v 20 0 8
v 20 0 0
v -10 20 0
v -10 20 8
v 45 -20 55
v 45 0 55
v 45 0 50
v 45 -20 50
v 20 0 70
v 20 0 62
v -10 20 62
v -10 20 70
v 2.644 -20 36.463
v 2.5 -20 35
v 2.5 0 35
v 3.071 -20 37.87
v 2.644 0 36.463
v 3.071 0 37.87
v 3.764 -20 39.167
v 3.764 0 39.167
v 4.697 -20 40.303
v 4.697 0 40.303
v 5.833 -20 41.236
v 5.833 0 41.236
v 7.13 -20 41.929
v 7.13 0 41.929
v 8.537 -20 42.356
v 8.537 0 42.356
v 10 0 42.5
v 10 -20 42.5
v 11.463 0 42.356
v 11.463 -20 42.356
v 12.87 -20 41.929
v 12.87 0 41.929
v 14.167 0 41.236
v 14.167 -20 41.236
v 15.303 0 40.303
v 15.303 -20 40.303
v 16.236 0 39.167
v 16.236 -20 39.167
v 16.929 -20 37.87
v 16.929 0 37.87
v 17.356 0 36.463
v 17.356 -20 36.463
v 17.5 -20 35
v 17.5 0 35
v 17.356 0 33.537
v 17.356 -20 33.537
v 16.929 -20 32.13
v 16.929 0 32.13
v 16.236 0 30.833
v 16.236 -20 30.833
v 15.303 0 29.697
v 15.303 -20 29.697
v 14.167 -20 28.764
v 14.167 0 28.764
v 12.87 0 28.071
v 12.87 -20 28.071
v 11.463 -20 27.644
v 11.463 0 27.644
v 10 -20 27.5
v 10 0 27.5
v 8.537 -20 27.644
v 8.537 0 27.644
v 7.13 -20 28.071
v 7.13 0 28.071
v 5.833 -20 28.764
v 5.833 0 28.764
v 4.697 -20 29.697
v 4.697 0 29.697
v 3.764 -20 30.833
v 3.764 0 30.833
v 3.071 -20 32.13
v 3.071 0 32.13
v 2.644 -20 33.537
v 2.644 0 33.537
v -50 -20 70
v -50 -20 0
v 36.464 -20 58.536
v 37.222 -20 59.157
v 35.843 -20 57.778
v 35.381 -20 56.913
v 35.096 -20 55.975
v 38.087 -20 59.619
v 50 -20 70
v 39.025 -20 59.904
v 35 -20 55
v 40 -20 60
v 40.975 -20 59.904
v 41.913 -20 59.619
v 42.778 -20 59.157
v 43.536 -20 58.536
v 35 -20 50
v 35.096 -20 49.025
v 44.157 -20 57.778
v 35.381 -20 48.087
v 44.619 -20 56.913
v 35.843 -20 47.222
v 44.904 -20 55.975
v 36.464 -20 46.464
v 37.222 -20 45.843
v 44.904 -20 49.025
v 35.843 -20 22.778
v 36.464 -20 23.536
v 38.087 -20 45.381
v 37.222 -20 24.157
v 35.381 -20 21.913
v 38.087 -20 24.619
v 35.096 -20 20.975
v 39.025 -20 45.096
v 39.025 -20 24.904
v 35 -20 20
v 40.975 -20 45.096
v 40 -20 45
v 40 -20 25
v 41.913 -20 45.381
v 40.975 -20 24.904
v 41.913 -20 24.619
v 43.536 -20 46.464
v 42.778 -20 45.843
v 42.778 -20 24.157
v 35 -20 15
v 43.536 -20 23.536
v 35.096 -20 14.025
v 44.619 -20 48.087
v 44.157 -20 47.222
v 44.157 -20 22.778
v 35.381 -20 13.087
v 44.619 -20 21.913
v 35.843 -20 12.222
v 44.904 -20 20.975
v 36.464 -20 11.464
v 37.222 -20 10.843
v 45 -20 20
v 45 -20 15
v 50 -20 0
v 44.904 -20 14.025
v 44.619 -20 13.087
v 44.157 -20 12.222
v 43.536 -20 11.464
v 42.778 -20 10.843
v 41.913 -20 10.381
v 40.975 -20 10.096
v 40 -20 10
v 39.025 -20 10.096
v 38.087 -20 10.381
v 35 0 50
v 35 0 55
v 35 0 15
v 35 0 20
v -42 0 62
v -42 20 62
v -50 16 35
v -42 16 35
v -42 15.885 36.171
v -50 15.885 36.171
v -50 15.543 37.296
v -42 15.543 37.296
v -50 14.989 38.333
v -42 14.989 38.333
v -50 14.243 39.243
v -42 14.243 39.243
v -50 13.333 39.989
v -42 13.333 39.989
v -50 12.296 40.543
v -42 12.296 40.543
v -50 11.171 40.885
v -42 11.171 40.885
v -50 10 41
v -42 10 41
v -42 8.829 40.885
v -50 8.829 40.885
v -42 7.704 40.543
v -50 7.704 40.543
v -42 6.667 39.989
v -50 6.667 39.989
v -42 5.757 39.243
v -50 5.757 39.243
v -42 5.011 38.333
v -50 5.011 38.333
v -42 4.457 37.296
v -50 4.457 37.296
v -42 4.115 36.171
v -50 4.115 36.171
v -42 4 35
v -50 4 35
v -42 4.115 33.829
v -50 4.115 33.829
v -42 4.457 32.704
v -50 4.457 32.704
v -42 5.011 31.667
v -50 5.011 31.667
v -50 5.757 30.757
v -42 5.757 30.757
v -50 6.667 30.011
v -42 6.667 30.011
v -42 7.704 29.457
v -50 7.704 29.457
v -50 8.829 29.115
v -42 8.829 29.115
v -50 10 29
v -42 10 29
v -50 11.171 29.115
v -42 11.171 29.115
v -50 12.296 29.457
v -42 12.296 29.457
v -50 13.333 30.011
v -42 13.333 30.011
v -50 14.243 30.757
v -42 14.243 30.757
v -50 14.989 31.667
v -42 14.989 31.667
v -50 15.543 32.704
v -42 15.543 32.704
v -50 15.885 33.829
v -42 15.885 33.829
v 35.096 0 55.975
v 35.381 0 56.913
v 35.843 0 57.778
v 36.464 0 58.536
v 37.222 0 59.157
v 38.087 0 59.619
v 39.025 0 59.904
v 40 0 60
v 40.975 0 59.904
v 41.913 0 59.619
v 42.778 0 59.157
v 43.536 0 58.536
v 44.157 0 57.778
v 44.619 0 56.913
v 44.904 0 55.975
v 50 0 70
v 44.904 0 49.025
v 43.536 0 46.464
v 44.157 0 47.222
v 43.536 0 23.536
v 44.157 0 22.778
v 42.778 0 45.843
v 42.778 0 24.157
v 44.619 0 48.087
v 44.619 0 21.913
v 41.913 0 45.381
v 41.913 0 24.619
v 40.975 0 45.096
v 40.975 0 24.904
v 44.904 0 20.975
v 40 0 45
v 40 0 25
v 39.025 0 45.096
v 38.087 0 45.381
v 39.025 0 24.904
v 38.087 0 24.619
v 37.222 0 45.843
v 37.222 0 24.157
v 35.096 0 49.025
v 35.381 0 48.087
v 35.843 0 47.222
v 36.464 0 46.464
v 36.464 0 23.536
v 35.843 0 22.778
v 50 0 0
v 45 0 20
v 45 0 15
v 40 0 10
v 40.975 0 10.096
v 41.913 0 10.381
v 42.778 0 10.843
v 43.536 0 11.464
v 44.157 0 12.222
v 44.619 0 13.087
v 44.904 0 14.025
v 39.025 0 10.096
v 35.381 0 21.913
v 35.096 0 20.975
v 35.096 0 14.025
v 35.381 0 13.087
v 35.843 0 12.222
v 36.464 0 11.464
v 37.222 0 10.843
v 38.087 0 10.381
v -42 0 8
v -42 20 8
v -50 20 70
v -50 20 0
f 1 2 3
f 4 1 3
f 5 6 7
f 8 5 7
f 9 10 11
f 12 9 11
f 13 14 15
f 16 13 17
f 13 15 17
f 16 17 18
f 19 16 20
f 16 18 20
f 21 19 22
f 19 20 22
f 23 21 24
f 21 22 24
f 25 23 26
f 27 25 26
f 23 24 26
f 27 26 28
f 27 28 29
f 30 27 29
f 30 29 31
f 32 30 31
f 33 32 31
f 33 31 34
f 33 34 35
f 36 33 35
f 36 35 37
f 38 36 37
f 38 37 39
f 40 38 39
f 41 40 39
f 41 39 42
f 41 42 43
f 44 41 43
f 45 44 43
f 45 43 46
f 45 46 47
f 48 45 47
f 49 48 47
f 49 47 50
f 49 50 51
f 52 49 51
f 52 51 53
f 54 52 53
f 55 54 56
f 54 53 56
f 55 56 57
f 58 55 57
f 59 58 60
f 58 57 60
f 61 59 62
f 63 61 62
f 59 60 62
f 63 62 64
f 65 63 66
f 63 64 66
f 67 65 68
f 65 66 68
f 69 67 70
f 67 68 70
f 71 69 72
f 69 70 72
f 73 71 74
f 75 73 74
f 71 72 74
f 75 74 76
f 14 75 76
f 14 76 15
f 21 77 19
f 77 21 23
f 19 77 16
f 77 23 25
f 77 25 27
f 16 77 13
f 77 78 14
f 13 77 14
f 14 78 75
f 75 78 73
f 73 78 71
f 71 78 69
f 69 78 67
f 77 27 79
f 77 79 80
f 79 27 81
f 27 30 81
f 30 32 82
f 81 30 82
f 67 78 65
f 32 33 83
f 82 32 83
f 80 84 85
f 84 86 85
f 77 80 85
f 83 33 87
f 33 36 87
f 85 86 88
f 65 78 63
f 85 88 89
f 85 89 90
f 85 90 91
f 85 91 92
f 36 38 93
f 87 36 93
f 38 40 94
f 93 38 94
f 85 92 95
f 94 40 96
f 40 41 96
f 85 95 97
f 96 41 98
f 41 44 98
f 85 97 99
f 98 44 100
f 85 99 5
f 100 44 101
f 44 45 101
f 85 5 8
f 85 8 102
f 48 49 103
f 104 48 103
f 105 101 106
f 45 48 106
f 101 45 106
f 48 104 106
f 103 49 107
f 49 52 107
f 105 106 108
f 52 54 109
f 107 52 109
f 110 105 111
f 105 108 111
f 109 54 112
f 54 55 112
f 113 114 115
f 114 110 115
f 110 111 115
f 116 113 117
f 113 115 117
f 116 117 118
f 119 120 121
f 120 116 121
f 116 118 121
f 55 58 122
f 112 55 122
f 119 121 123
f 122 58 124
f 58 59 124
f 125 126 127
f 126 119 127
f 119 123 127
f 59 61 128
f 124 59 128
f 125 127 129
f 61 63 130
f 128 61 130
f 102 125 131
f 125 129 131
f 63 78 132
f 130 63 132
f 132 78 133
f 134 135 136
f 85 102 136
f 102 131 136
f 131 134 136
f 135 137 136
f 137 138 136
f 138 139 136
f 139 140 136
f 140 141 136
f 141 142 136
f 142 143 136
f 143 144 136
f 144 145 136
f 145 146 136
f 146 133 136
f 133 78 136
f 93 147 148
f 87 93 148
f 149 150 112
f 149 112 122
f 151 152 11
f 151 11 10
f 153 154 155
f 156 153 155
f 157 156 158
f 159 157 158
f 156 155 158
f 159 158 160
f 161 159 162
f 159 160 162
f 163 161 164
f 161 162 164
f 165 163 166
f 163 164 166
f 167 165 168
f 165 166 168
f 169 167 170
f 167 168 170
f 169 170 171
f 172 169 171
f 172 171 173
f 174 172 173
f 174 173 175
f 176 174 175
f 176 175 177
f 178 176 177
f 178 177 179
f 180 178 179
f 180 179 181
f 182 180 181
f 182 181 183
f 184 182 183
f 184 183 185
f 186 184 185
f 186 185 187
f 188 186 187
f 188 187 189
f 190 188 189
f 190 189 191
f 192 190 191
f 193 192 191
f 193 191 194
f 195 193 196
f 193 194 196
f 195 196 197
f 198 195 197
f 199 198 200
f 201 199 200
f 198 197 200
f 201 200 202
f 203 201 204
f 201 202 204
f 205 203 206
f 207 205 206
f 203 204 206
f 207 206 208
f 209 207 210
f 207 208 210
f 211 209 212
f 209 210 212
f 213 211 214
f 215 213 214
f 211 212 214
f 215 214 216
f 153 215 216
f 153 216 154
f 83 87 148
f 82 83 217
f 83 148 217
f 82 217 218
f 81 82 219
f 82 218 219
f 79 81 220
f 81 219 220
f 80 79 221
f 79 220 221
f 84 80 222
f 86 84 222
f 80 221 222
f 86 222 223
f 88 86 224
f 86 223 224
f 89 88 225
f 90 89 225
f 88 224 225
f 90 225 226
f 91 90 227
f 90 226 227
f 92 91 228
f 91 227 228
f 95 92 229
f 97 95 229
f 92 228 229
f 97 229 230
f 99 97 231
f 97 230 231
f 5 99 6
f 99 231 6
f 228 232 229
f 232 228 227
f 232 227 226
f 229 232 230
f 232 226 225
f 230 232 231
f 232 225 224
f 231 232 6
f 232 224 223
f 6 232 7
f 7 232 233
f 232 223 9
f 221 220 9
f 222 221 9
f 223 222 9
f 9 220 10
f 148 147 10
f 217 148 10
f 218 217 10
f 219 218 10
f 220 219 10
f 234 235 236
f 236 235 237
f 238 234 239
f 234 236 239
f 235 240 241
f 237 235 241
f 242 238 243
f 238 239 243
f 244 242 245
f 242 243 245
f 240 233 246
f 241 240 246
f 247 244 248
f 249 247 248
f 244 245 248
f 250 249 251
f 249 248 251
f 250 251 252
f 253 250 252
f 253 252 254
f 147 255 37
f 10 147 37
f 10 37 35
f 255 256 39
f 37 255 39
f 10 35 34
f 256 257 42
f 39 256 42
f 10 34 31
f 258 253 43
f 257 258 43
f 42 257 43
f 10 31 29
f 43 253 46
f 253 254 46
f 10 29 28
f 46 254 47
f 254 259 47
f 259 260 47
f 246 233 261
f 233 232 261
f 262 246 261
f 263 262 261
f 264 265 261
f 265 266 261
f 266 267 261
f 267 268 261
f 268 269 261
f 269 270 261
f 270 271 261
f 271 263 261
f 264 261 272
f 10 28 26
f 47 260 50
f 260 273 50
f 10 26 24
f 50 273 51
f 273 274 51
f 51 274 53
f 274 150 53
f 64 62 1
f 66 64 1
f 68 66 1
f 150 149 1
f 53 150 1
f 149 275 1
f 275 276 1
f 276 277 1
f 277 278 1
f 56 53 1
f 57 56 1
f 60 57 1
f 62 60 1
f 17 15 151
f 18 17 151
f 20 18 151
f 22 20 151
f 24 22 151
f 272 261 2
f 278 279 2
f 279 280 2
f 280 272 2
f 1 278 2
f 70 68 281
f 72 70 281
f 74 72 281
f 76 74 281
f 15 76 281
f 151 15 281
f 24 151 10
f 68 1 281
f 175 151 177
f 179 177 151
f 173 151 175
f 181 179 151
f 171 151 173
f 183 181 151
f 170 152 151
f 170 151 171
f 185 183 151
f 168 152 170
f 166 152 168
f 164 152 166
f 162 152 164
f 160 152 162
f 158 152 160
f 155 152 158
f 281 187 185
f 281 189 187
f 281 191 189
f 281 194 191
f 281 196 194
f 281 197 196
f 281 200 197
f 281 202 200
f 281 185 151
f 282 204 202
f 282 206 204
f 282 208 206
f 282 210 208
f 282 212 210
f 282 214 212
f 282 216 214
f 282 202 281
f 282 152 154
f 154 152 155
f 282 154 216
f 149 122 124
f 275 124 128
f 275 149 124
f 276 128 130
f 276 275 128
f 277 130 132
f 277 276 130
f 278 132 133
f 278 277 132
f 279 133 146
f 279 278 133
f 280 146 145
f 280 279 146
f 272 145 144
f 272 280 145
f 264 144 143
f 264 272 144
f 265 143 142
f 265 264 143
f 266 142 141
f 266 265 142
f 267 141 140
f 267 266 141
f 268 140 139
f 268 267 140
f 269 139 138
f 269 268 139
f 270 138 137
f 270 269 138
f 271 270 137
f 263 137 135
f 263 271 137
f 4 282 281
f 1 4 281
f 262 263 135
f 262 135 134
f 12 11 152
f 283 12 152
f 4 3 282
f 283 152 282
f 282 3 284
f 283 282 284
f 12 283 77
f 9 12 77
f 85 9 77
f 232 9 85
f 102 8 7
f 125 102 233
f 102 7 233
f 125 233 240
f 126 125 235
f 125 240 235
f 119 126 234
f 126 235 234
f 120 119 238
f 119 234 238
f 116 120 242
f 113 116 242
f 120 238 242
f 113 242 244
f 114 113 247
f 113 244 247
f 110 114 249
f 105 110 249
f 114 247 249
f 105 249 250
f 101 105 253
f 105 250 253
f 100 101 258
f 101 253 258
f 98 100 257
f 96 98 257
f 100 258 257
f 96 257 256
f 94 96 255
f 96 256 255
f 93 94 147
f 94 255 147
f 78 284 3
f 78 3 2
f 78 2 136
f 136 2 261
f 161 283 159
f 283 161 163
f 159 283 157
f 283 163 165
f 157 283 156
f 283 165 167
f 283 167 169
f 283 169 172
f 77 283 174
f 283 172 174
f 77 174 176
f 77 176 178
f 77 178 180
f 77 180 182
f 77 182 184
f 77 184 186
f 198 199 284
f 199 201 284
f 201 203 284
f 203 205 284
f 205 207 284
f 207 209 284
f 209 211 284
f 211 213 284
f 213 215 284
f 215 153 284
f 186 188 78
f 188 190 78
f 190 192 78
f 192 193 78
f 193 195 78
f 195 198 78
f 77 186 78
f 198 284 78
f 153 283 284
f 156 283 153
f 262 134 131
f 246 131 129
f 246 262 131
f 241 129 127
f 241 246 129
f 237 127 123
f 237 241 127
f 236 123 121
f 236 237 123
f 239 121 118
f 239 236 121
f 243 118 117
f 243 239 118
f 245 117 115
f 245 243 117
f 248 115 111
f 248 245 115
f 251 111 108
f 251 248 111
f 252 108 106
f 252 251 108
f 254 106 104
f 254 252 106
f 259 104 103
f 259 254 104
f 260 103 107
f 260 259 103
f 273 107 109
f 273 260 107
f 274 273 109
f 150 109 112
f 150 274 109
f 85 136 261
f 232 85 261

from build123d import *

# Parameters (mm, degrees)
EXTRUDE_1_DEPTH     = 70
SKETCH_2_W          = 84
SKETCH_2_H          = 54
CUT_EXTRUDE_1_DEPTH = 20
SKETCH_3_R          = 7.5
CUT_EXTRUDE_2_DEPTH = 89.317608663
CUT_EXTRUDE_3_DEPTH = 89.317608663
SKETCH_4_R          = 6
CUT_EXTRUDE_4_DEPTH = 118.320075008


with BuildPart() as part:
    # Эскиз1 → Бобышка-Вытянуть1 (new body)
    with BuildSketch(Plane.XY):
        Polygon((50, -20), (50, 0), (20, 0), (-10, 20), (-50, 20), (-50, -20), align=None)
    extrude(amount=EXTRUDE_1_DEPTH)

    # Эскиз2 → Вырез-Вытянуть1 (cut)
    with BuildSketch(Plane(origin=(0, 20, 0), x_dir=(1, 0, 0), z_dir=(0, 1, 0))):
        with Locations((0, -35)):
            Rectangle(SKETCH_2_W, SKETCH_2_H)
    extrude(amount=-CUT_EXTRUDE_1_DEPTH, mode=Mode.SUBTRACT)

    # Эскиз3 → Вырез-Вытянуть2 (cut, through all)
    with BuildSketch(Plane(origin=(0, 0, 0), x_dir=(1, 0, 0), z_dir=(0, 1, 0))):
        with Locations(Location((10, -35, 0), (0, 0, 180))):
            Circle(SKETCH_3_R)
    extrude(amount=-CUT_EXTRUDE_2_DEPTH, mode=Mode.SUBTRACT)

    # Эскиз3<4> → Вырез-Вытянуть3 (cut, through all)
    with BuildSketch(Plane(origin=(0, 0, 0), x_dir=(1, 0, 0), z_dir=(0, 1, 0))):
        with BuildLine():
            Line((35, -20), (35, -15))
            ThreePointArc((35, -15), (40, -10), (45, -15))
            Line((45, -15), (45, -20))
            ThreePointArc((45, -20), (40, -25), (35, -20))
        make_face()
    cut_extrude_3 = extrude(amount=-CUT_EXTRUDE_3_DEPTH, mode=Mode.SUBTRACT)

    # Зеркальное отражение1: Вырез-Вытянуть3 across plane
    add(cut_extrude_3.mirror(Plane(origin=(0, 0, 35), x_dir=(1, 0, 0), z_dir=(0, 0, -1))), mode=Mode.SUBTRACT)

    # Эскиз4 → Вырез-Вытянуть4 (cut, through all)
    with BuildSketch(Plane(origin=(-42, 0, 0), x_dir=(0, 0, -1), z_dir=(1, 0, 0))):
        with Locations(Location((-35, 10, 0), (0, 0, 90))):
            Circle(SKETCH_4_R)
    extrude(amount=-CUT_EXTRUDE_4_DEPTH, mode=Mode.SUBTRACT)


solid = part.part
